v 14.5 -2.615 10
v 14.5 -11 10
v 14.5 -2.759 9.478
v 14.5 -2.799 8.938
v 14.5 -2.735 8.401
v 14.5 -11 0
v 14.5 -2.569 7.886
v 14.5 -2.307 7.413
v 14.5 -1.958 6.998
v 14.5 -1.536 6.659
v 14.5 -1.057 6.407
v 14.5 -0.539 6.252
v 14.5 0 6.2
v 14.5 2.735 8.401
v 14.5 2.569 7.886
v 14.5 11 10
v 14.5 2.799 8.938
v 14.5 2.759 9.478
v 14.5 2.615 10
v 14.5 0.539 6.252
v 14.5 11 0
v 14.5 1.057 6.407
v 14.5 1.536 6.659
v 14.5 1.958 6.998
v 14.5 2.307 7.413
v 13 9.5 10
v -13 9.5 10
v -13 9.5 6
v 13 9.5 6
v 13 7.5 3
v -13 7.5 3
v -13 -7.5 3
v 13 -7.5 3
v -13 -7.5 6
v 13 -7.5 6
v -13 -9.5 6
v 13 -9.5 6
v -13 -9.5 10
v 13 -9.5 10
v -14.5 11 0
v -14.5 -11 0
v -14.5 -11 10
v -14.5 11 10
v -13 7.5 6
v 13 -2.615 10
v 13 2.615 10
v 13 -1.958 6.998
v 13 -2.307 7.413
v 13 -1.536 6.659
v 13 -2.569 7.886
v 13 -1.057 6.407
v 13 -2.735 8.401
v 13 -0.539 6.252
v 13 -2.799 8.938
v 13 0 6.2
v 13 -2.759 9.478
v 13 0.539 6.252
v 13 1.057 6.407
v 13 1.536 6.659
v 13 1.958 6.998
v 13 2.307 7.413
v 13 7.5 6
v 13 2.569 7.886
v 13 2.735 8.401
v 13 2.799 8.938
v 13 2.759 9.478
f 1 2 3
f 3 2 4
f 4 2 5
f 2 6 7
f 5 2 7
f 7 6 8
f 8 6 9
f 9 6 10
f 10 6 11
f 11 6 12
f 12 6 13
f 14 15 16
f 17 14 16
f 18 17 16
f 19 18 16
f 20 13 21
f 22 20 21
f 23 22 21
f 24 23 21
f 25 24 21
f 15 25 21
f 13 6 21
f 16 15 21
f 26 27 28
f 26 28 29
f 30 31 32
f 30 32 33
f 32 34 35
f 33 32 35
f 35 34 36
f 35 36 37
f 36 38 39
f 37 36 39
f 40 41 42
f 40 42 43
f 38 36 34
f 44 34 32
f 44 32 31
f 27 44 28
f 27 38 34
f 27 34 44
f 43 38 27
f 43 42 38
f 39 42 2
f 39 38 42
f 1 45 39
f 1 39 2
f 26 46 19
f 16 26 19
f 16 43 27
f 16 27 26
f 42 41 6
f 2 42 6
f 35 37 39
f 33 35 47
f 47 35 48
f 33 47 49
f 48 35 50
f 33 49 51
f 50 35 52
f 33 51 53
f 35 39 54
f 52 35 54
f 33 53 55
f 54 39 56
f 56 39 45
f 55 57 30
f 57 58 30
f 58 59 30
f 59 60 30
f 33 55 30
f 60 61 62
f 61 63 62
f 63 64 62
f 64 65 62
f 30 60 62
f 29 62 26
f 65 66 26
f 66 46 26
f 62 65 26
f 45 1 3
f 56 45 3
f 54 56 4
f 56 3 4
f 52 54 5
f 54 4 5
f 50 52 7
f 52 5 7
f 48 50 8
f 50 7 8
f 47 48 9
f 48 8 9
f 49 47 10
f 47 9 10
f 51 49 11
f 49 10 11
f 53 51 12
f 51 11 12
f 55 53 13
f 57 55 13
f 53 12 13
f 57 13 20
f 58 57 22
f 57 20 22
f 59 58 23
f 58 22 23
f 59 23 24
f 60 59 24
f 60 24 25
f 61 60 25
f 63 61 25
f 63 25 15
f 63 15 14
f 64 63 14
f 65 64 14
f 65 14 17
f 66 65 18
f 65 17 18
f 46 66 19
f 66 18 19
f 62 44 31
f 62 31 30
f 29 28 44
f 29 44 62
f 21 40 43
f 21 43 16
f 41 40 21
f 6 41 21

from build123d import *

# Parameters (mm, degrees)
SKETCH_W        = 29
SKETCH_H        = 22
PAD_DEPTH       = 10
SKETCH001_W     = 26
SKETCH001_H     = 15
POCKET_DEPTH    = 7
SKETCH002_W     = 26
SKETCH002_H     = 19
POCKET001_DEPTH = 4
POCKET002_DEPTH = 1.5


with BuildPart() as part:
    # Sketch → Pad (new body)
    with BuildSketch(Plane.XY):
        Rectangle(SKETCH_W, SKETCH_H)
    extrude(amount=PAD_DEPTH)

    # Sketch001 → Pocket (cut)
    with BuildSketch(Plane.XY.offset(10)):
        Rectangle(SKETCH001_W, SKETCH001_H)
    extrude(amount=-POCKET_DEPTH, mode=Mode.SUBTRACT)

    # Sketch002 → Pocket001 (cut)
    with BuildSketch(Plane.XY.offset(10)):
        Rectangle(SKETCH002_W, SKETCH002_H)
    extrude(amount=-POCKET001_DEPTH, mode=Mode.SUBTRACT)

    # Sketch003 → Pocket002 (cut)
    with BuildSketch(Plane.YZ.offset(14.5)):
        with BuildLine():
            ThreePointArc((-2.615339, 10), (0, 6.2), (2.615339, 10))
            Line((-2.615339, 10), (2.615339, 10))
        make_face()
    extrude(amount=-POCKET002_DEPTH, mode=Mode.SUBTRACT)


solid = part.part
